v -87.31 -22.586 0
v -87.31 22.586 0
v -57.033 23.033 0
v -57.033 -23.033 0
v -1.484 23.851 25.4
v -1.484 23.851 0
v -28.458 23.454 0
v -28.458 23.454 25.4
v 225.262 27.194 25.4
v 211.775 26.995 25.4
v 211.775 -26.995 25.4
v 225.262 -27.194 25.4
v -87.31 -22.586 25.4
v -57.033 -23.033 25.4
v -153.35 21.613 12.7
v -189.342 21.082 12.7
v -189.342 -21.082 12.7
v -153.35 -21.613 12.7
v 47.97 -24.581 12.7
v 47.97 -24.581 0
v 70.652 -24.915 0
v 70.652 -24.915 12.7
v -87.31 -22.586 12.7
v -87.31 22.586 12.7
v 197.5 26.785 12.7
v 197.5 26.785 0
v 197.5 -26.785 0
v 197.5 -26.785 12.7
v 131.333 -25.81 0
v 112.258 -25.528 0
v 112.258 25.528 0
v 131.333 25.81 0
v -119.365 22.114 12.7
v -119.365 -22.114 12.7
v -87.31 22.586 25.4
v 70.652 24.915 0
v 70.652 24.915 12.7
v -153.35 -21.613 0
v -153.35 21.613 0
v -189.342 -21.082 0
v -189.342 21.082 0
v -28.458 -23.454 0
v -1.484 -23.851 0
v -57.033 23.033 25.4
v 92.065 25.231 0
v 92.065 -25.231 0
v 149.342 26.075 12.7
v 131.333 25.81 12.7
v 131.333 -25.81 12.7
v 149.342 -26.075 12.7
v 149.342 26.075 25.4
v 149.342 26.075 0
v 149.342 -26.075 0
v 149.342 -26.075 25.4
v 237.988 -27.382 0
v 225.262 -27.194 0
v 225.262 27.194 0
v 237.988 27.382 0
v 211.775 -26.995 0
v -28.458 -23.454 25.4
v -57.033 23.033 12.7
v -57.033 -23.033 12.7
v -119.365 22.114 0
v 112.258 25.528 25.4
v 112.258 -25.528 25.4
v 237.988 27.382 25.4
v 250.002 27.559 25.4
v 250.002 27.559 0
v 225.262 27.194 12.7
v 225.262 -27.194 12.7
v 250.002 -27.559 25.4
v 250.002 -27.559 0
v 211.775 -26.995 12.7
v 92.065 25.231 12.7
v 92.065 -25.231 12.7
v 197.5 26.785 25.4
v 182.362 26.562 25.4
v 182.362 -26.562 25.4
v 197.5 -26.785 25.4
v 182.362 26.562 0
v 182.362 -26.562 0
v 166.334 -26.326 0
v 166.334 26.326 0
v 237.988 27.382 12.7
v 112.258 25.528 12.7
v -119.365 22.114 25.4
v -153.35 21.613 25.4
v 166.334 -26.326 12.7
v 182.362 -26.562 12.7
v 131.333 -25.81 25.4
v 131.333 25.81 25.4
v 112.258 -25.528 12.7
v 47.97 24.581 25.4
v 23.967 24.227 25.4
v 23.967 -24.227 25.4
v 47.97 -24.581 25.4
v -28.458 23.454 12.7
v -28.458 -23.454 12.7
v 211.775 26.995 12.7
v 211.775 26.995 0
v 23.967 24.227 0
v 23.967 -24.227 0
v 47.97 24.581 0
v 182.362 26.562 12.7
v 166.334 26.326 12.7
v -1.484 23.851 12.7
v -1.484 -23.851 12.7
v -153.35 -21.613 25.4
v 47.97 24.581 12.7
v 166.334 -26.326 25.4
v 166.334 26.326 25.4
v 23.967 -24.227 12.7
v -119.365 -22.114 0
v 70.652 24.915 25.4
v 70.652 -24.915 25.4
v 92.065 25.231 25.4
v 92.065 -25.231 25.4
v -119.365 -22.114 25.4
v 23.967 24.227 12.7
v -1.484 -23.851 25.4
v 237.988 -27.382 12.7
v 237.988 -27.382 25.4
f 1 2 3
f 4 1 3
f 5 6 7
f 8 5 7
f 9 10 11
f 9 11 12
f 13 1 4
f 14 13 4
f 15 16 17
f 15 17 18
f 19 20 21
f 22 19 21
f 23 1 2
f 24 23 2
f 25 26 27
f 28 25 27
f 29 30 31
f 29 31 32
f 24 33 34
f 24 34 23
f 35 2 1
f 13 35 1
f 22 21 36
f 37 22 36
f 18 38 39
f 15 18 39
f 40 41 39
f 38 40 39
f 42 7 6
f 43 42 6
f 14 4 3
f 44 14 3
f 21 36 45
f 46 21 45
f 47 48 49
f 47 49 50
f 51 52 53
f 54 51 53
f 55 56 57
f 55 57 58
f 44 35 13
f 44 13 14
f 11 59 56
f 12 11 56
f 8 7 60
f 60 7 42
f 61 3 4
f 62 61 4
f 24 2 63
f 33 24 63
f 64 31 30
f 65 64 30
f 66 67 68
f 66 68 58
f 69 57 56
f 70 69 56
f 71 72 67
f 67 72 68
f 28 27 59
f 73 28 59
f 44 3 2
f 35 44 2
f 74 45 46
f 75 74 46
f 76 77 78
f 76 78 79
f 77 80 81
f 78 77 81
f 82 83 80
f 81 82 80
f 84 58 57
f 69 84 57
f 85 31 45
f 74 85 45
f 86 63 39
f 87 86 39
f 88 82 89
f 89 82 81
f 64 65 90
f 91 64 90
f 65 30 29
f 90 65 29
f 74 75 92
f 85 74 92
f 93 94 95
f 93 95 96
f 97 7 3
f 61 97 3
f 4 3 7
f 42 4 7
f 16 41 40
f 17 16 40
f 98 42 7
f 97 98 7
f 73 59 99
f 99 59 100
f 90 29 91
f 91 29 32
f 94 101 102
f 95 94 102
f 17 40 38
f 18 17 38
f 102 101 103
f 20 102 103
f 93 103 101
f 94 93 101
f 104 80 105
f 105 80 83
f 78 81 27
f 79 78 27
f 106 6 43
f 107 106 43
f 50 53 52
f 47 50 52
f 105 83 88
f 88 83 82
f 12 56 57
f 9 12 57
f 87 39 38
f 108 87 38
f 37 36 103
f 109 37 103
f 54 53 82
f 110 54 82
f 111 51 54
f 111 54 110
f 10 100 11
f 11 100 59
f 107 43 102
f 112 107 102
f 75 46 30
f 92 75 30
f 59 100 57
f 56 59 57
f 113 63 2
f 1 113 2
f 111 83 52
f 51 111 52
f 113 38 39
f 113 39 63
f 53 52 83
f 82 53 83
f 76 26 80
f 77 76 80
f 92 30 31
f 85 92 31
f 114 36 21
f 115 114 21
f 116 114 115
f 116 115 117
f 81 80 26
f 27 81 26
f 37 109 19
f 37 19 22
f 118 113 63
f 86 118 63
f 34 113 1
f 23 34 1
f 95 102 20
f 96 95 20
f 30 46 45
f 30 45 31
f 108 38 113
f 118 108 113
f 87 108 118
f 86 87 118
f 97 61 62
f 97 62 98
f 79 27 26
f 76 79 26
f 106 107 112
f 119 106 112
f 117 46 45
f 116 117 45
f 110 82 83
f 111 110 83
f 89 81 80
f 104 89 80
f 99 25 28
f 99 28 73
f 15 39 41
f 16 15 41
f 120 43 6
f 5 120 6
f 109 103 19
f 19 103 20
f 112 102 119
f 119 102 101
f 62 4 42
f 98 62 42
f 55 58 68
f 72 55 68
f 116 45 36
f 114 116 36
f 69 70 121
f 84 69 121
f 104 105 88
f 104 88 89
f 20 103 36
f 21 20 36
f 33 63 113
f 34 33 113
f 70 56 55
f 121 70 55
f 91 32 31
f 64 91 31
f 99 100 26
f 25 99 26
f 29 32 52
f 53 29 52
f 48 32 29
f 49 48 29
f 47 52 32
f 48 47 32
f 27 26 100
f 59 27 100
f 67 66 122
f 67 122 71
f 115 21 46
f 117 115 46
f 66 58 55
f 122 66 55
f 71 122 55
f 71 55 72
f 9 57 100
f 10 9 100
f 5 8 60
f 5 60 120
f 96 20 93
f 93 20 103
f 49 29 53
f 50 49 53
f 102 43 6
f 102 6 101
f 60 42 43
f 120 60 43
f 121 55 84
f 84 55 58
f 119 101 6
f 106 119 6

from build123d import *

# Parameters (mm, degrees)
F1_DEPTH = 25.4
F2_DEPTH = 12.7


with BuildPart() as f1:
    # F0 (on Top) → F1 (new body)
    with BuildSketch(Plane.XY):
        Polygon((-153.35019981, 21.6126069839), (-153.35019981, 0), (-119.36499981, 0), (-119.36499981, 22.1136317859), align=None)
        Polygon((-119.36499981, 0), (-153.35019981, 0), (-153.35019981, -21.6126069839), (-119.36499981, -22.1136317859), align=None)
    extrude(amount=F1_DEPTH)


with BuildPart() as f1b:
    # F0 (on Top) → F1, piece 2 (new body)
    with BuildSketch(Plane.XY):
        Polygon((-87.31019981, 22.58619778), (-87.31019981, 0), (-57.03339981, 0), (-57.03339981, 23.0325517142), align=None)
        Polygon((-57.03339981, 0), (-87.31019981, 0), (-87.31019981, -22.58619778), (-57.03339981, -23.0325517142), align=None)
    extrude(amount=F1_DEPTH)


with BuildPart() as f1c:
    # F0 (on Top) → F1, piece 3 (new body)
    with BuildSketch(Plane.XY):
        Polygon((-28.45839981, 23.4538169625), (-28.45839981, 0), (-1.48359981, 0), (-1.48359981, 23.8514913569), align=None)
        Polygon((-1.48359981, 0), (-28.45839981, 0), (-28.45839981, -23.4538169625), (-1.48359981, -23.8514913569), align=None)
    extrude(amount=F1_DEPTH)


with BuildPart() as f1d:
    # F0 (on Top) → F1, piece 4 (new body)
    with BuildSketch(Plane.XY):
        Polygon((23.96720019, 24.2266982714), (23.96720019, 0), (47.97020019, 0), (47.97020019, 24.58056108), align=None)
        Polygon((47.97020019, 0), (23.96720019, 0), (23.96720019, -24.2266982714), (47.97020019, -24.58056108), align=None)
    extrude(amount=F1_DEPTH)


with BuildPart() as f1e:
    # F0 (on Top) → F1, piece 5 (new body)
    with BuildSketch(Plane.XY):
        Polygon((70.65240019, 24.9149520726), (70.65240019, 0), (92.06460019, 0), (92.06460019, 25.2306201653), align=None)
        Polygon((92.06460019, 0), (70.65240019, 0), (70.65240019, -24.9149520726), (92.06460019, -25.2306201653), align=None)
    extrude(amount=F1_DEPTH)


with BuildPart() as f1f:
    # F0 (on Top) → F1, piece 6 (new body)
    with BuildSketch(Plane.XY):
        Polygon((112.25760019, 25.5283142742), (112.25760019, 0), (131.33300019, 0), (131.33300019, 25.809532231), align=None)
        Polygon((131.33300019, 0), (112.25760019, 0), (112.25760019, -25.5283142742), (131.33300019, -25.809532231), align=None)
    extrude(amount=F1_DEPTH)


with BuildPart() as f1g:
    # F0 (on Top) → F1, piece 7 (new body)
    with BuildSketch(Plane.XY):
        Polygon((149.34160019, 26.075022952), (149.34160019, 0), (166.33420019, 0), (166.33420019, 26.325535353), align=None)
        Polygon((166.33420019, 0), (149.34160019, 0), (149.34160019, -26.075022952), (166.33420019, -26.325535353), align=None)
    extrude(amount=F1_DEPTH)


with BuildPart() as f1h:
    # F0 (on Top) → F1, piece 8 (new body)
    with BuildSketch(Plane.XY):
        Polygon((182.36160019, 26.56181835), (182.36160019, 0), (197.50000019, 0), (197.50000019, 26.7849953171), align=None)
        Polygon((197.50000019, 0), (182.36160019, 0), (182.36160019, -26.56181835), (197.50000019, -26.7849953171), align=None)
    extrude(amount=F1_DEPTH)


with BuildPart() as f1i:
    # F0 (on Top) → F1, piece 9 (new body)
    with BuildSketch(Plane.XY):
        Polygon((211.77480019, 26.9954407123), (211.77480019, 0), (225.26220019, 0), (225.26220019, 27.1942779095), align=None)
        Polygon((225.26220019, 0), (211.77480019, 0), (211.77480019, -26.9954407123), (225.26220019, -27.1942779095), align=None)
    extrude(amount=F1_DEPTH)


with BuildPart() as f1j:
    # F0 (on Top) → F1, piece 10 (new body)
    with BuildSketch(Plane.XY):
        Polygon((237.98760019, 27.3818813667), (237.98760019, 0), (250.00180019, 0), (250.00180019, 27.559), align=None)
        Polygon((250.00180019, 0), (237.98760019, 0), (237.98760019, -27.3818813667), (250.00180019, -27.559), align=None)
    extrude(amount=F1_DEPTH)


with BuildPart() as f2:
    # F0 (on Top) → F2 (new body)
    with BuildSketch(Plane.XY):
        Polygon((-189.34199981, 21.082), (-189.34199981, 0), (-153.35019981, 0), (-153.35019981, 21.6126069839), align=None)
        Polygon((-153.35019981, 0), (-189.34199981, 0), (-189.34199981, -21.082), (-153.35019981, -21.6126069839), align=None)
    extrude(amount=F2_DEPTH)


with BuildPart() as f2b:
    # F0 (on Top) → F2, piece 2 (new body)
    with BuildSketch(Plane.XY):
        Polygon((-119.36499981, 22.1136317859), (-119.36499981, 0), (-87.31019981, 0), (-87.31019981, 22.58619778), align=None)
        Polygon((-87.31019981, 0), (-119.36499981, 0), (-119.36499981, -22.1136317859), (-87.31019981, -22.58619778), align=None)
    extrude(amount=F2_DEPTH)


with BuildPart() as f2c:
    # F0 (on Top) → F2, piece 3 (new body)
    with BuildSketch(Plane.XY):
        Polygon((-57.03339981, 23.0325517142), (-57.03339981, 0), (-28.45839981, 0), (-28.45839981, 23.4538169625), align=None)
        Polygon((-28.45839981, 0), (-57.03339981, 0), (-57.03339981, -23.0325517142), (-28.45839981, -23.4538169625), align=None)
    extrude(amount=F2_DEPTH)


with BuildPart() as f2d:
    # F0 (on Top) → F2, piece 4 (new body)
    with BuildSketch(Plane.XY):
        Polygon((-1.48359981, 23.8514913569), (-1.48359981, 0), (23.96720019, 0), (23.96720019, 24.2266982714), align=None)
        Polygon((23.96720019, 0), (-1.48359981, 0), (-1.48359981, -23.8514913569), (23.96720019, -24.2266982714), align=None)
    extrude(amount=F2_DEPTH)


with BuildPart() as f2e:
    # F0 (on Top) → F2, piece 5 (new body)
    with BuildSketch(Plane.XY):
        Polygon((47.97020019, 24.58056108), (47.97020019, 0), (70.65240019, 0), (70.65240019, 24.9149520726), align=None)
        Polygon((70.65240019, 0), (47.97020019, 0), (47.97020019, -24.58056108), (70.65240019, -24.9149520726), align=None)
    extrude(amount=F2_DEPTH)


with BuildPart() as f2f:
    # F0 (on Top) → F2, piece 6 (new body)
    with BuildSketch(Plane.XY):
        Polygon((92.06460019, 25.2306201653), (92.06460019, 0), (112.25760019, 0), (112.25760019, 25.5283142742), align=None)
        Polygon((112.25760019, 0), (92.06460019, 0), (92.06460019, -25.2306201653), (112.25760019, -25.5283142742), align=None)
    extrude(amount=F2_DEPTH)


with BuildPart() as f2g:
    # F0 (on Top) → F2, piece 7 (new body)
    with BuildSketch(Plane.XY):
        Polygon((131.33300019, 25.809532231), (131.33300019, 0), (149.34160019, 0), (149.34160019, 26.075022952), align=None)
        Polygon((149.34160019, 0), (131.33300019, 0), (131.33300019, -25.809532231), (149.34160019, -26.075022952), align=None)
    extrude(amount=F2_DEPTH)


with BuildPart() as f2h:
    # F0 (on Top) → F2, piece 8 (new body)
    with BuildSketch(Plane.XY):
        Polygon((166.33420019, 26.325535353), (166.33420019, 0), (182.36160019, 0), (182.36160019, 26.56181835), align=None)
        Polygon((182.36160019, 0), (166.33420019, 0), (166.33420019, -26.325535353), (182.36160019, -26.56181835), align=None)
    extrude(amount=F2_DEPTH)


with BuildPart() as f2i:
    # F0 (on Top) → F2, piece 9 (new body)
    with BuildSketch(Plane.XY):
        Polygon((197.50000019, 26.7849953171), (197.50000019, 0), (211.77480019, 0), (211.77480019, 26.9954407123), align=None)
        Polygon((211.77480019, 0), (197.50000019, 0), (197.50000019, -26.7849953171), (211.77480019, -26.9954407123), align=None)
    extrude(amount=F2_DEPTH)


with BuildPart() as f2j:
    # F0 (on Top) → F2, piece 10 (new body)
    with BuildSketch(Plane.XY):
        Polygon((225.26220019, 27.1942779095), (225.26220019, 0), (237.98760019, 0), (237.98760019, 27.3818813667), align=None)
        Polygon((237.98760019, 0), (225.26220019, 0), (225.26220019, -27.1942779095), (237.98760019, -27.3818813667), align=None)
    extrude(amount=F2_DEPTH)


solid = Compound([f1.part, f1b.part, f1c.part, f1d.part, f1e.part, f1f.part, f1g.part, f1h.part, f1i.part, f1j.part, f2.part, f2b.part, f2c.part, f2d.part, f2e.part, f2f.part, f2g.part, f2h.part, f2i.part, f2j.part])
